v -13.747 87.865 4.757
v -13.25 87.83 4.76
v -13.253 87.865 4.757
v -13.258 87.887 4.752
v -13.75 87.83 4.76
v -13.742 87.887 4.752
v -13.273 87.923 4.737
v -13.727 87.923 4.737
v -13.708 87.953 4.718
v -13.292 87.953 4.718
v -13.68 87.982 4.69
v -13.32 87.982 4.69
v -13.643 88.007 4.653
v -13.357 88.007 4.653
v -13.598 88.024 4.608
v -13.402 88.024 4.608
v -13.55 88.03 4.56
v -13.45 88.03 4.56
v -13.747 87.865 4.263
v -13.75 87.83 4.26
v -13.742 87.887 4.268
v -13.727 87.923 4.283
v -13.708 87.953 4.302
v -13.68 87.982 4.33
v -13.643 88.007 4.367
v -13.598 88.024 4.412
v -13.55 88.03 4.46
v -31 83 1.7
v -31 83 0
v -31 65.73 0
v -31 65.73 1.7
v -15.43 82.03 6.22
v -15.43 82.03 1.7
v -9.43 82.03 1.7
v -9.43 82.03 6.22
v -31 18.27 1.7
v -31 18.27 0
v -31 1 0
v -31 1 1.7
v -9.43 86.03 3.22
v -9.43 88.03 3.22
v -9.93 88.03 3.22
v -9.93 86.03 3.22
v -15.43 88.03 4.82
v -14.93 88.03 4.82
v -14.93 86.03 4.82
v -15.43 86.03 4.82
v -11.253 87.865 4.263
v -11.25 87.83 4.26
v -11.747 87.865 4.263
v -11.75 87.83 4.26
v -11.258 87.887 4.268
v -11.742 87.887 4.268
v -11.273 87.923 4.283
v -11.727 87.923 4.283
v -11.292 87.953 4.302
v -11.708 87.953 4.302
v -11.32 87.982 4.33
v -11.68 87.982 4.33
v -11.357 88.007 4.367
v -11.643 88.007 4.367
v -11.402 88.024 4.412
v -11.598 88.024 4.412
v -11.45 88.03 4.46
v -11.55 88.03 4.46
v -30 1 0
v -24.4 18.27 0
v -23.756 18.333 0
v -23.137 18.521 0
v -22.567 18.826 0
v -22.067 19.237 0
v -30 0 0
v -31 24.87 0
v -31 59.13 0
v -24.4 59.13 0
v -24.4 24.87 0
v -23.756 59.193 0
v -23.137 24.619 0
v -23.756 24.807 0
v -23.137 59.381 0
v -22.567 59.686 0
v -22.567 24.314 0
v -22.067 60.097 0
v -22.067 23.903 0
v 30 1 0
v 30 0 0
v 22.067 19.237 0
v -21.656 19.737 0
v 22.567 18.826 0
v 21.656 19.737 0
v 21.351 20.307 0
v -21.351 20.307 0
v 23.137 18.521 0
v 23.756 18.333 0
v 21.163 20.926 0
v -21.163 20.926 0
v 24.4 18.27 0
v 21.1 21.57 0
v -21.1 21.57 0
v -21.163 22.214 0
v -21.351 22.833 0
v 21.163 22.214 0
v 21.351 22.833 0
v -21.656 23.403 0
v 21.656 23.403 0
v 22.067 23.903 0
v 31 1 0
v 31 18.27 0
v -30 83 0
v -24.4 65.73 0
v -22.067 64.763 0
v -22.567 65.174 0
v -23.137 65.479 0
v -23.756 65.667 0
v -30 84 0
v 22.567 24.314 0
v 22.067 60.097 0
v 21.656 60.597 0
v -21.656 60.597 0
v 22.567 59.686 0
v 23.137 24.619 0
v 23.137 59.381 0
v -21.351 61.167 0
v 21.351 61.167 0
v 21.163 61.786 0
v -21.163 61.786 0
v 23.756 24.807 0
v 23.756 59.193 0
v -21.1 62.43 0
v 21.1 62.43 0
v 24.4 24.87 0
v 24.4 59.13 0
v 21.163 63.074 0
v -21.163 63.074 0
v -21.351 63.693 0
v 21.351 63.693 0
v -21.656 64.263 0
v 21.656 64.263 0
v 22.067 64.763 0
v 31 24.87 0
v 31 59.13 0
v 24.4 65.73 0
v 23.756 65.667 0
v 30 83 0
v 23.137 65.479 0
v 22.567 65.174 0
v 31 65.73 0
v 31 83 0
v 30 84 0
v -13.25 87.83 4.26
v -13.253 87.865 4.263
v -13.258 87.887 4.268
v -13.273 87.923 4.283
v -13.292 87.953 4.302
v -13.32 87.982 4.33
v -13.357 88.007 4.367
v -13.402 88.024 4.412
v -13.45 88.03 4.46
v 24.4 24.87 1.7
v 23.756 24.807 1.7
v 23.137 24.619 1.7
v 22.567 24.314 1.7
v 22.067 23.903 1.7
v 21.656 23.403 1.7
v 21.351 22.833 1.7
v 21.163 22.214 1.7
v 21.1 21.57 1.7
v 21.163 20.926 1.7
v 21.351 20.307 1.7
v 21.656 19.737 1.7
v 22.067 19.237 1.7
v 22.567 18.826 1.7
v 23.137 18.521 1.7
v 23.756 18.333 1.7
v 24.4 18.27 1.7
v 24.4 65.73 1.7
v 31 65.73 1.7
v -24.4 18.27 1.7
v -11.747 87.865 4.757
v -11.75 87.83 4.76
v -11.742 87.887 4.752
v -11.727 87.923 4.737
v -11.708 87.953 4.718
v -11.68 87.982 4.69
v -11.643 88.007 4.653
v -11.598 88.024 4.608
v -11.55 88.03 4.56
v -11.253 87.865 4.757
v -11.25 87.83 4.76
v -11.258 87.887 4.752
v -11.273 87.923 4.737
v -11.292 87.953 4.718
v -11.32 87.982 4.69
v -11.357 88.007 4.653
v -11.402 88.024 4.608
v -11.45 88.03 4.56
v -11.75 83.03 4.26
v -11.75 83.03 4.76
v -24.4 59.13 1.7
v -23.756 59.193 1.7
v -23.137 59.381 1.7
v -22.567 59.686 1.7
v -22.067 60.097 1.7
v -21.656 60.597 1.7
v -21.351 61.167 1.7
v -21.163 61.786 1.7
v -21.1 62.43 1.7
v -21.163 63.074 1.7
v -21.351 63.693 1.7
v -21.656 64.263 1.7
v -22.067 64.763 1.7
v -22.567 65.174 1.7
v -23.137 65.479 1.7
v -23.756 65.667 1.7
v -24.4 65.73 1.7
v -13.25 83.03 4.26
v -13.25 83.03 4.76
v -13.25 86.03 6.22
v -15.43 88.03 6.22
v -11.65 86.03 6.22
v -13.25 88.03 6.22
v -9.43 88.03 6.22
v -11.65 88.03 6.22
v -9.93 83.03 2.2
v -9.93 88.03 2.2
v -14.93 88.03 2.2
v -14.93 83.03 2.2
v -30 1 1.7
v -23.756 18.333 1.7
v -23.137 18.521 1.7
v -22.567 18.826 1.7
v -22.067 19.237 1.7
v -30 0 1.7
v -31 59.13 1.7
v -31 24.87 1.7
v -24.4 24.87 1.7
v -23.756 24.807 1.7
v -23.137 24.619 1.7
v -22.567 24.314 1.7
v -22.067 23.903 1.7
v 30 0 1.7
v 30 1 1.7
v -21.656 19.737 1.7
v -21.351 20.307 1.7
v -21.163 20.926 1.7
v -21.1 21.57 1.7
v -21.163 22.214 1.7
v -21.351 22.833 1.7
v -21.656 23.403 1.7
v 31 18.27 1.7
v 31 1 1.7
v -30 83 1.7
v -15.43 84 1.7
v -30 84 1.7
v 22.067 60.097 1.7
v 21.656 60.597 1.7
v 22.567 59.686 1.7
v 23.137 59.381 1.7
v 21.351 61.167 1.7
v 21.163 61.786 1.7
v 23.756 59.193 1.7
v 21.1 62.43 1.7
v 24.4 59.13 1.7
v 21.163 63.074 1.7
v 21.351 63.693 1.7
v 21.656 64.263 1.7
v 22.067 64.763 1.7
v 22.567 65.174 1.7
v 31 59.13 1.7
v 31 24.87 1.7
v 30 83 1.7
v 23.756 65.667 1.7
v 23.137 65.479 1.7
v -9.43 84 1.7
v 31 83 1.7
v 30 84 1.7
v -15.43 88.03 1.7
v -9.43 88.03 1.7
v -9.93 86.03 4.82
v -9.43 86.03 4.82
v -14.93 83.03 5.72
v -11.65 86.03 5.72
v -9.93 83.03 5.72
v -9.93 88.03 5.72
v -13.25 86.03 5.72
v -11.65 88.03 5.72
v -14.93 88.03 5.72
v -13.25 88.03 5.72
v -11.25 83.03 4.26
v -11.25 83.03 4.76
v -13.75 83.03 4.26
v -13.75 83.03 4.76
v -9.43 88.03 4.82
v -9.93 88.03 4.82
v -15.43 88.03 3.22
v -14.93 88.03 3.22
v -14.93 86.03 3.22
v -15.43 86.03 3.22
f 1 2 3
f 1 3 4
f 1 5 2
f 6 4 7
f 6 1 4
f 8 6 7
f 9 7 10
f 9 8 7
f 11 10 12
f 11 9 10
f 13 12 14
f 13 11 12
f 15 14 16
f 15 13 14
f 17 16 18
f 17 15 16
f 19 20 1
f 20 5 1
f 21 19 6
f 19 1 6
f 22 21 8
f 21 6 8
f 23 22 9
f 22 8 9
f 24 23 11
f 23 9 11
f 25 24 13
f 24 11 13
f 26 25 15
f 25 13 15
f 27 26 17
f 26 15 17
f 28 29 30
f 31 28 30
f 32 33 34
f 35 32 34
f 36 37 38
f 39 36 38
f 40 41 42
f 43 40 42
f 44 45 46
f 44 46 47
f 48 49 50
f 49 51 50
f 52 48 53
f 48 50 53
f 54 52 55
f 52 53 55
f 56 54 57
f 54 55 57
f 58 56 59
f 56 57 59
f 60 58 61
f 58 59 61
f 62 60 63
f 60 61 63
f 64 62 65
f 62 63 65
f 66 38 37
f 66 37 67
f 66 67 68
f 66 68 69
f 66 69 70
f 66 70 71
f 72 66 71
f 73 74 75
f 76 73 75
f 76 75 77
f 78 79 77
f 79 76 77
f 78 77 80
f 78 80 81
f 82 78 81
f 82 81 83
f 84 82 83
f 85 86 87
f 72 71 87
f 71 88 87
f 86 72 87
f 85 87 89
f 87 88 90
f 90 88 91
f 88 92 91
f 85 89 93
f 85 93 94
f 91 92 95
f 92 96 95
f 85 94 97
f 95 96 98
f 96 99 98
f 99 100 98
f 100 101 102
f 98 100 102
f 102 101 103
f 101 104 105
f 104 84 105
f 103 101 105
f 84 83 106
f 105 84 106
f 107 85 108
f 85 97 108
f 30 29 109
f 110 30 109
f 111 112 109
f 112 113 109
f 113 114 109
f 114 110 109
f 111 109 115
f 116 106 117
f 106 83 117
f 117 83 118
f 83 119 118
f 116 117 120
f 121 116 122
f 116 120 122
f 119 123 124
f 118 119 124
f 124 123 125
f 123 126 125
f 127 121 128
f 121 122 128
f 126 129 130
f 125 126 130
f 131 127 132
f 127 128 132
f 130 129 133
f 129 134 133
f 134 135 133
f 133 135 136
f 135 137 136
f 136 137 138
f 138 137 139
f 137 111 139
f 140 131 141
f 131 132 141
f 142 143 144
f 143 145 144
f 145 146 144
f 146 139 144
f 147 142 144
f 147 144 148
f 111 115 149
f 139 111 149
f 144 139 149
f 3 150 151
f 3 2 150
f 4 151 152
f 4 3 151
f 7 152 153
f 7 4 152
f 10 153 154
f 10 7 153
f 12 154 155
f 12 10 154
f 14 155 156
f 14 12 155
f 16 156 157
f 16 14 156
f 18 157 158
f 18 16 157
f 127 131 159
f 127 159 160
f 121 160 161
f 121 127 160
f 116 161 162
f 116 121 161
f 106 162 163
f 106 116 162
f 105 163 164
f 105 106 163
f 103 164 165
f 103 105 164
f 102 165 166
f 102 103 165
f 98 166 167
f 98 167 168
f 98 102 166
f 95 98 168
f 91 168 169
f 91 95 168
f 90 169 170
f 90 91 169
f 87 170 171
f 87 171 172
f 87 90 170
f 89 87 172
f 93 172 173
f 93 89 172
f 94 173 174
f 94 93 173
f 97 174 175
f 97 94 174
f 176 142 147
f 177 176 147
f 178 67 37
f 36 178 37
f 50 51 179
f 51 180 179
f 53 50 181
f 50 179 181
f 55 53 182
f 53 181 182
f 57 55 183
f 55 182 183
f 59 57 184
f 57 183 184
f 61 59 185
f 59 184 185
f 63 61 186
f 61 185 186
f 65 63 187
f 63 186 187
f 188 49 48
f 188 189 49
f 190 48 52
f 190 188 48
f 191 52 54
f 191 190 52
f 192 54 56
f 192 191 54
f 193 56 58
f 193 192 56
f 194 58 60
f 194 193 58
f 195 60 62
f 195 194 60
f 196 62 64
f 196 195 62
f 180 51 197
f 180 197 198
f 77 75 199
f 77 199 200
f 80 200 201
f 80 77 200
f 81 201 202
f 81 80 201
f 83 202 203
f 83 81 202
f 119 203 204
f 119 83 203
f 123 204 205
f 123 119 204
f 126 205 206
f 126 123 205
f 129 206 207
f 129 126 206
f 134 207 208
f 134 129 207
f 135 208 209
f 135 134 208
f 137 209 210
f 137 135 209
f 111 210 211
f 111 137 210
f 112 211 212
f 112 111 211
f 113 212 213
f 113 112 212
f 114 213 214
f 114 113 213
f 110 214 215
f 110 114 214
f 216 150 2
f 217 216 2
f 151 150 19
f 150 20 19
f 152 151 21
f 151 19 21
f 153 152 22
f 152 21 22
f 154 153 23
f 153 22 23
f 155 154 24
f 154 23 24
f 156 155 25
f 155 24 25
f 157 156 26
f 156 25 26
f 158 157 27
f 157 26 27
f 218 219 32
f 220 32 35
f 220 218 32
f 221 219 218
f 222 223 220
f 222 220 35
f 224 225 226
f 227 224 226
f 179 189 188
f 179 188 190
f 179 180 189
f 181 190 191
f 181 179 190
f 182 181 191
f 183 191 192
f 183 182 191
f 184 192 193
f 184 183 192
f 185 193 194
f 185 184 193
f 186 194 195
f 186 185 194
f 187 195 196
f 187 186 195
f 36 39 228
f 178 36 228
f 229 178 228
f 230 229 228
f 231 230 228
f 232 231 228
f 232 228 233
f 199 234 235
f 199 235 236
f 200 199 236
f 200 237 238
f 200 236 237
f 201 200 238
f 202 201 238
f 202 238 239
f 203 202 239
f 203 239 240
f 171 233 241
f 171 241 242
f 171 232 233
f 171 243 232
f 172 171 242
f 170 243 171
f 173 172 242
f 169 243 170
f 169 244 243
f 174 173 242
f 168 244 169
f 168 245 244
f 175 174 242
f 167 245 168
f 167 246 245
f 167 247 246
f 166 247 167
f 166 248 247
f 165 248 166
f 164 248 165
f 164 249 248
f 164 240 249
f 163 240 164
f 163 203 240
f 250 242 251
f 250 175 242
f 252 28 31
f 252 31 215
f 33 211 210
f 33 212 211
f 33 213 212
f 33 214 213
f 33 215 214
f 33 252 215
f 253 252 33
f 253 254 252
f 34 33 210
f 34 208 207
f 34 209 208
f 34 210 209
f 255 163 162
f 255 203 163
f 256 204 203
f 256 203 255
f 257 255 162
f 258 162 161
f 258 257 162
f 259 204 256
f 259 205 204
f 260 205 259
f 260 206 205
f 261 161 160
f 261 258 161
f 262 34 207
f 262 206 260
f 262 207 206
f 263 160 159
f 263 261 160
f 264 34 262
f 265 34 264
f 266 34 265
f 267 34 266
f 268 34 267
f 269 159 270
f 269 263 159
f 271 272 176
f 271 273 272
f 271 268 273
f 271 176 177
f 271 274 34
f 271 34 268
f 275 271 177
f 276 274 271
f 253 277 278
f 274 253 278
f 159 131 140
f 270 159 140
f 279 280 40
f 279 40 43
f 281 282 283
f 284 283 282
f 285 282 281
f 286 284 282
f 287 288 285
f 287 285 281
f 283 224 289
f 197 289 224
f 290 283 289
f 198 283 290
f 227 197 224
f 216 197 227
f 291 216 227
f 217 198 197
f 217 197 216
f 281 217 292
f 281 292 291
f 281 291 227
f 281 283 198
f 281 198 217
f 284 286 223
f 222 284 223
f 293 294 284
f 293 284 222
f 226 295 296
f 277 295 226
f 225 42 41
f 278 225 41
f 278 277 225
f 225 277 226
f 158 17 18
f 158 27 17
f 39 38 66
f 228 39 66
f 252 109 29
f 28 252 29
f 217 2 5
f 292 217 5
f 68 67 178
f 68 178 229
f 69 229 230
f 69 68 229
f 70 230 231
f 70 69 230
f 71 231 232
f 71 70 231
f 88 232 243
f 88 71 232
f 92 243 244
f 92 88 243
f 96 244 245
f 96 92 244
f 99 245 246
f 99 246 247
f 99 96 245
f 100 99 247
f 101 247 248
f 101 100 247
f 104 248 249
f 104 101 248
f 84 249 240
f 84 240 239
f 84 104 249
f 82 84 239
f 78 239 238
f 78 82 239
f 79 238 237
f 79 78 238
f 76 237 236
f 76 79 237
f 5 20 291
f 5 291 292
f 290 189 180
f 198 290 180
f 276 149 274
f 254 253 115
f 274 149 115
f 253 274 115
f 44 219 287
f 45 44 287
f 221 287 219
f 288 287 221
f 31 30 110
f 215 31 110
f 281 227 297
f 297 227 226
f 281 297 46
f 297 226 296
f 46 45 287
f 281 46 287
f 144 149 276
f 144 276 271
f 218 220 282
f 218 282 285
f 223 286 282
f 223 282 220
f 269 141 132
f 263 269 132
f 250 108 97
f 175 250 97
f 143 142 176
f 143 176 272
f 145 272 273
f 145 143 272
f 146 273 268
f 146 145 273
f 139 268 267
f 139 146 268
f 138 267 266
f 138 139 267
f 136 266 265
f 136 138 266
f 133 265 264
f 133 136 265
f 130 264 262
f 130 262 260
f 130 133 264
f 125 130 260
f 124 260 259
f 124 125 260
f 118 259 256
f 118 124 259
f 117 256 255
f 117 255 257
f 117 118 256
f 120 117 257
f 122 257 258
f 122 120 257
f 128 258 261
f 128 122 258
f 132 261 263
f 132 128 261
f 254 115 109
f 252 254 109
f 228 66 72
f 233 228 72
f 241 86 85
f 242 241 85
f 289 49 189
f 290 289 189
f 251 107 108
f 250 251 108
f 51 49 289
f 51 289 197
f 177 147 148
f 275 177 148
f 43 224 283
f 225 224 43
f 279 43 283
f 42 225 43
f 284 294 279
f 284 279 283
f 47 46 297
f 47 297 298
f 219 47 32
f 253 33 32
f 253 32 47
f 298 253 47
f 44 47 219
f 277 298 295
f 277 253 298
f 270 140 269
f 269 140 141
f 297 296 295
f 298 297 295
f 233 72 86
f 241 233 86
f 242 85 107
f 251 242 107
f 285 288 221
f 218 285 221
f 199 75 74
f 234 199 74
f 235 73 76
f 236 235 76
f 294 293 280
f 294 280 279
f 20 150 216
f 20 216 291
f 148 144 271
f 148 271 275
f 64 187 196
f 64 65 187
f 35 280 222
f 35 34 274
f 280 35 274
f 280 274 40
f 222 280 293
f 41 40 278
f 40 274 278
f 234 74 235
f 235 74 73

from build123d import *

# Parameters (mm, degrees)
PAD_DEPTH       = 1.7
SKETCH002_W     = 6
SKETCH002_H     = 6
PAD009_DEPTH    = 4.52
SKETCH022_W     = 5
SKETCH022_H     = 3.52
SKETCH022_W_2   = 0.5
SKETCH022_H_2   = 0.5
POCKET011_DEPTH = 5
SKETCH023_W     = 0.5
SKETCH023_H     = 1.6
SKETCH023_W_2   = 1.6
SKETCH023_H_2   = 0.5
POCKET012_DEPTH = 2
FILLET015_R     = 0.2


with BuildPart() as part:
    # Sketch → Pad (new body)
    with BuildSketch(Plane.XY):
        with BuildLine():
            Line((0, 0), (30, 0))
            Line((30, 0), (30, 1))
            Line((30, 1), (31, 1))
            Line((31, 1), (31, 18.27))
            Line((31, 18.27), (24.4, 18.27))
            ThreePointArc((24.4, 24.87), (21.1, 21.57), (24.4, 18.27))
            Line((24.4, 24.87), (31, 24.87))
            Line((31, 24.87), (31, 59.13))
            Line((31, 59.13), (24.4, 59.13))
            ThreePointArc((24.4, 65.73), (21.1, 62.43), (24.4, 59.13))
            Line((24.4, 65.73), (31, 65.73))
            Line((31, 65.73), (31, 83))
            Line((30, 83), (31, 83))
            Line((30, 84), (30, 83))
            Line((30, 84), (0, 84))
            Line((0, 84), (-30, 84))
            Line((-30, 84), (-30, 83))
            Line((-30, 83), (-31, 83))
            Line((-31, 83), (-31, 65.73))
            Line((-31, 65.73), (-24.4, 65.73))
            ThreePointArc((-24.4, 59.13), (-21.1, 62.43), (-24.4, 65.73))
            Line((-24.4, 59.13), (-31, 59.13))
            Line((-31, 59.13), (-31, 24.87))
            Line((-31, 24.87), (-24.4, 24.87))
            ThreePointArc((-24.4, 18.27), (-21.1, 21.57), (-24.4, 24.87))
            Line((-24.4, 18.27), (-31, 18.27))
            Line((-31, 18.27), (-31, 1))
            Line((-31, 1), (-30, 1))
            Line((-30, 1), (-30, 0))
            Line((-30, 0), (0, 0))
        make_face()
    extrude(amount=PAD_DEPTH)

    # Sketch002 → Pad009 (new body)
    with BuildSketch(Plane.XY.offset(1.7)):
        with Locations((-12.43, 85.03)):
            Rectangle(SKETCH002_W, SKETCH002_H)
    extrude(amount=PAD009_DEPTH)

    # Sketch022 → Pocket011 (cut)
    with BuildSketch(Plane(origin=(0, 88.03, 0), x_dir=(-1, 0, 0), z_dir=(0, 1, 0))):
        with Locations((12.43, 3.96)):
            Rectangle(SKETCH022_W, SKETCH022_H)
        with Locations((11.5, 4.51)):
            Rectangle(SKETCH022_W_2, SKETCH022_H_2, mode=Mode.SUBTRACT)
        with Locations((13.5, 4.51)):
            Rectangle(SKETCH022_W_2, SKETCH022_H_2, mode=Mode.SUBTRACT)
    extrude(amount=-POCKET011_DEPTH, mode=Mode.SUBTRACT)

    # Sketch023 → Pocket012 (cut)
    with BuildSketch(Plane(origin=(0, 88.03, 0), x_dir=(-1, 0, 0), z_dir=(0, 1, 0))):
        with Locations((9.68, 4.02)):
            Rectangle(SKETCH023_W, SKETCH023_H)
        with Locations((15.18, 4.02)):
            Rectangle(SKETCH023_W, SKETCH023_H)
        with Locations((12.45003, 5.97)):
            Rectangle(SKETCH023_W_2, SKETCH023_H_2)
    extrude(amount=-POCKET012_DEPTH, mode=Mode.SUBTRACT)

    # Fillet015
    fillet015_edges = [part.edges().sort_by_distance(p)[0] for p in [
        (-13.5, 88.03, 4.76),
        (-13.75, 88.03, 4.51),
        (-13.5, 88.03, 4.26),
        (-13.25, 88.03, 4.51),
        (-11.5, 88.03, 4.76),
        (-11.75, 88.03, 4.51),
        (-11.5, 88.03, 4.26),
        (-11.25, 88.03, 4.51),
    ]]
    fillet(fillet015_edges, radius=FILLET015_R)


solid = part.part
